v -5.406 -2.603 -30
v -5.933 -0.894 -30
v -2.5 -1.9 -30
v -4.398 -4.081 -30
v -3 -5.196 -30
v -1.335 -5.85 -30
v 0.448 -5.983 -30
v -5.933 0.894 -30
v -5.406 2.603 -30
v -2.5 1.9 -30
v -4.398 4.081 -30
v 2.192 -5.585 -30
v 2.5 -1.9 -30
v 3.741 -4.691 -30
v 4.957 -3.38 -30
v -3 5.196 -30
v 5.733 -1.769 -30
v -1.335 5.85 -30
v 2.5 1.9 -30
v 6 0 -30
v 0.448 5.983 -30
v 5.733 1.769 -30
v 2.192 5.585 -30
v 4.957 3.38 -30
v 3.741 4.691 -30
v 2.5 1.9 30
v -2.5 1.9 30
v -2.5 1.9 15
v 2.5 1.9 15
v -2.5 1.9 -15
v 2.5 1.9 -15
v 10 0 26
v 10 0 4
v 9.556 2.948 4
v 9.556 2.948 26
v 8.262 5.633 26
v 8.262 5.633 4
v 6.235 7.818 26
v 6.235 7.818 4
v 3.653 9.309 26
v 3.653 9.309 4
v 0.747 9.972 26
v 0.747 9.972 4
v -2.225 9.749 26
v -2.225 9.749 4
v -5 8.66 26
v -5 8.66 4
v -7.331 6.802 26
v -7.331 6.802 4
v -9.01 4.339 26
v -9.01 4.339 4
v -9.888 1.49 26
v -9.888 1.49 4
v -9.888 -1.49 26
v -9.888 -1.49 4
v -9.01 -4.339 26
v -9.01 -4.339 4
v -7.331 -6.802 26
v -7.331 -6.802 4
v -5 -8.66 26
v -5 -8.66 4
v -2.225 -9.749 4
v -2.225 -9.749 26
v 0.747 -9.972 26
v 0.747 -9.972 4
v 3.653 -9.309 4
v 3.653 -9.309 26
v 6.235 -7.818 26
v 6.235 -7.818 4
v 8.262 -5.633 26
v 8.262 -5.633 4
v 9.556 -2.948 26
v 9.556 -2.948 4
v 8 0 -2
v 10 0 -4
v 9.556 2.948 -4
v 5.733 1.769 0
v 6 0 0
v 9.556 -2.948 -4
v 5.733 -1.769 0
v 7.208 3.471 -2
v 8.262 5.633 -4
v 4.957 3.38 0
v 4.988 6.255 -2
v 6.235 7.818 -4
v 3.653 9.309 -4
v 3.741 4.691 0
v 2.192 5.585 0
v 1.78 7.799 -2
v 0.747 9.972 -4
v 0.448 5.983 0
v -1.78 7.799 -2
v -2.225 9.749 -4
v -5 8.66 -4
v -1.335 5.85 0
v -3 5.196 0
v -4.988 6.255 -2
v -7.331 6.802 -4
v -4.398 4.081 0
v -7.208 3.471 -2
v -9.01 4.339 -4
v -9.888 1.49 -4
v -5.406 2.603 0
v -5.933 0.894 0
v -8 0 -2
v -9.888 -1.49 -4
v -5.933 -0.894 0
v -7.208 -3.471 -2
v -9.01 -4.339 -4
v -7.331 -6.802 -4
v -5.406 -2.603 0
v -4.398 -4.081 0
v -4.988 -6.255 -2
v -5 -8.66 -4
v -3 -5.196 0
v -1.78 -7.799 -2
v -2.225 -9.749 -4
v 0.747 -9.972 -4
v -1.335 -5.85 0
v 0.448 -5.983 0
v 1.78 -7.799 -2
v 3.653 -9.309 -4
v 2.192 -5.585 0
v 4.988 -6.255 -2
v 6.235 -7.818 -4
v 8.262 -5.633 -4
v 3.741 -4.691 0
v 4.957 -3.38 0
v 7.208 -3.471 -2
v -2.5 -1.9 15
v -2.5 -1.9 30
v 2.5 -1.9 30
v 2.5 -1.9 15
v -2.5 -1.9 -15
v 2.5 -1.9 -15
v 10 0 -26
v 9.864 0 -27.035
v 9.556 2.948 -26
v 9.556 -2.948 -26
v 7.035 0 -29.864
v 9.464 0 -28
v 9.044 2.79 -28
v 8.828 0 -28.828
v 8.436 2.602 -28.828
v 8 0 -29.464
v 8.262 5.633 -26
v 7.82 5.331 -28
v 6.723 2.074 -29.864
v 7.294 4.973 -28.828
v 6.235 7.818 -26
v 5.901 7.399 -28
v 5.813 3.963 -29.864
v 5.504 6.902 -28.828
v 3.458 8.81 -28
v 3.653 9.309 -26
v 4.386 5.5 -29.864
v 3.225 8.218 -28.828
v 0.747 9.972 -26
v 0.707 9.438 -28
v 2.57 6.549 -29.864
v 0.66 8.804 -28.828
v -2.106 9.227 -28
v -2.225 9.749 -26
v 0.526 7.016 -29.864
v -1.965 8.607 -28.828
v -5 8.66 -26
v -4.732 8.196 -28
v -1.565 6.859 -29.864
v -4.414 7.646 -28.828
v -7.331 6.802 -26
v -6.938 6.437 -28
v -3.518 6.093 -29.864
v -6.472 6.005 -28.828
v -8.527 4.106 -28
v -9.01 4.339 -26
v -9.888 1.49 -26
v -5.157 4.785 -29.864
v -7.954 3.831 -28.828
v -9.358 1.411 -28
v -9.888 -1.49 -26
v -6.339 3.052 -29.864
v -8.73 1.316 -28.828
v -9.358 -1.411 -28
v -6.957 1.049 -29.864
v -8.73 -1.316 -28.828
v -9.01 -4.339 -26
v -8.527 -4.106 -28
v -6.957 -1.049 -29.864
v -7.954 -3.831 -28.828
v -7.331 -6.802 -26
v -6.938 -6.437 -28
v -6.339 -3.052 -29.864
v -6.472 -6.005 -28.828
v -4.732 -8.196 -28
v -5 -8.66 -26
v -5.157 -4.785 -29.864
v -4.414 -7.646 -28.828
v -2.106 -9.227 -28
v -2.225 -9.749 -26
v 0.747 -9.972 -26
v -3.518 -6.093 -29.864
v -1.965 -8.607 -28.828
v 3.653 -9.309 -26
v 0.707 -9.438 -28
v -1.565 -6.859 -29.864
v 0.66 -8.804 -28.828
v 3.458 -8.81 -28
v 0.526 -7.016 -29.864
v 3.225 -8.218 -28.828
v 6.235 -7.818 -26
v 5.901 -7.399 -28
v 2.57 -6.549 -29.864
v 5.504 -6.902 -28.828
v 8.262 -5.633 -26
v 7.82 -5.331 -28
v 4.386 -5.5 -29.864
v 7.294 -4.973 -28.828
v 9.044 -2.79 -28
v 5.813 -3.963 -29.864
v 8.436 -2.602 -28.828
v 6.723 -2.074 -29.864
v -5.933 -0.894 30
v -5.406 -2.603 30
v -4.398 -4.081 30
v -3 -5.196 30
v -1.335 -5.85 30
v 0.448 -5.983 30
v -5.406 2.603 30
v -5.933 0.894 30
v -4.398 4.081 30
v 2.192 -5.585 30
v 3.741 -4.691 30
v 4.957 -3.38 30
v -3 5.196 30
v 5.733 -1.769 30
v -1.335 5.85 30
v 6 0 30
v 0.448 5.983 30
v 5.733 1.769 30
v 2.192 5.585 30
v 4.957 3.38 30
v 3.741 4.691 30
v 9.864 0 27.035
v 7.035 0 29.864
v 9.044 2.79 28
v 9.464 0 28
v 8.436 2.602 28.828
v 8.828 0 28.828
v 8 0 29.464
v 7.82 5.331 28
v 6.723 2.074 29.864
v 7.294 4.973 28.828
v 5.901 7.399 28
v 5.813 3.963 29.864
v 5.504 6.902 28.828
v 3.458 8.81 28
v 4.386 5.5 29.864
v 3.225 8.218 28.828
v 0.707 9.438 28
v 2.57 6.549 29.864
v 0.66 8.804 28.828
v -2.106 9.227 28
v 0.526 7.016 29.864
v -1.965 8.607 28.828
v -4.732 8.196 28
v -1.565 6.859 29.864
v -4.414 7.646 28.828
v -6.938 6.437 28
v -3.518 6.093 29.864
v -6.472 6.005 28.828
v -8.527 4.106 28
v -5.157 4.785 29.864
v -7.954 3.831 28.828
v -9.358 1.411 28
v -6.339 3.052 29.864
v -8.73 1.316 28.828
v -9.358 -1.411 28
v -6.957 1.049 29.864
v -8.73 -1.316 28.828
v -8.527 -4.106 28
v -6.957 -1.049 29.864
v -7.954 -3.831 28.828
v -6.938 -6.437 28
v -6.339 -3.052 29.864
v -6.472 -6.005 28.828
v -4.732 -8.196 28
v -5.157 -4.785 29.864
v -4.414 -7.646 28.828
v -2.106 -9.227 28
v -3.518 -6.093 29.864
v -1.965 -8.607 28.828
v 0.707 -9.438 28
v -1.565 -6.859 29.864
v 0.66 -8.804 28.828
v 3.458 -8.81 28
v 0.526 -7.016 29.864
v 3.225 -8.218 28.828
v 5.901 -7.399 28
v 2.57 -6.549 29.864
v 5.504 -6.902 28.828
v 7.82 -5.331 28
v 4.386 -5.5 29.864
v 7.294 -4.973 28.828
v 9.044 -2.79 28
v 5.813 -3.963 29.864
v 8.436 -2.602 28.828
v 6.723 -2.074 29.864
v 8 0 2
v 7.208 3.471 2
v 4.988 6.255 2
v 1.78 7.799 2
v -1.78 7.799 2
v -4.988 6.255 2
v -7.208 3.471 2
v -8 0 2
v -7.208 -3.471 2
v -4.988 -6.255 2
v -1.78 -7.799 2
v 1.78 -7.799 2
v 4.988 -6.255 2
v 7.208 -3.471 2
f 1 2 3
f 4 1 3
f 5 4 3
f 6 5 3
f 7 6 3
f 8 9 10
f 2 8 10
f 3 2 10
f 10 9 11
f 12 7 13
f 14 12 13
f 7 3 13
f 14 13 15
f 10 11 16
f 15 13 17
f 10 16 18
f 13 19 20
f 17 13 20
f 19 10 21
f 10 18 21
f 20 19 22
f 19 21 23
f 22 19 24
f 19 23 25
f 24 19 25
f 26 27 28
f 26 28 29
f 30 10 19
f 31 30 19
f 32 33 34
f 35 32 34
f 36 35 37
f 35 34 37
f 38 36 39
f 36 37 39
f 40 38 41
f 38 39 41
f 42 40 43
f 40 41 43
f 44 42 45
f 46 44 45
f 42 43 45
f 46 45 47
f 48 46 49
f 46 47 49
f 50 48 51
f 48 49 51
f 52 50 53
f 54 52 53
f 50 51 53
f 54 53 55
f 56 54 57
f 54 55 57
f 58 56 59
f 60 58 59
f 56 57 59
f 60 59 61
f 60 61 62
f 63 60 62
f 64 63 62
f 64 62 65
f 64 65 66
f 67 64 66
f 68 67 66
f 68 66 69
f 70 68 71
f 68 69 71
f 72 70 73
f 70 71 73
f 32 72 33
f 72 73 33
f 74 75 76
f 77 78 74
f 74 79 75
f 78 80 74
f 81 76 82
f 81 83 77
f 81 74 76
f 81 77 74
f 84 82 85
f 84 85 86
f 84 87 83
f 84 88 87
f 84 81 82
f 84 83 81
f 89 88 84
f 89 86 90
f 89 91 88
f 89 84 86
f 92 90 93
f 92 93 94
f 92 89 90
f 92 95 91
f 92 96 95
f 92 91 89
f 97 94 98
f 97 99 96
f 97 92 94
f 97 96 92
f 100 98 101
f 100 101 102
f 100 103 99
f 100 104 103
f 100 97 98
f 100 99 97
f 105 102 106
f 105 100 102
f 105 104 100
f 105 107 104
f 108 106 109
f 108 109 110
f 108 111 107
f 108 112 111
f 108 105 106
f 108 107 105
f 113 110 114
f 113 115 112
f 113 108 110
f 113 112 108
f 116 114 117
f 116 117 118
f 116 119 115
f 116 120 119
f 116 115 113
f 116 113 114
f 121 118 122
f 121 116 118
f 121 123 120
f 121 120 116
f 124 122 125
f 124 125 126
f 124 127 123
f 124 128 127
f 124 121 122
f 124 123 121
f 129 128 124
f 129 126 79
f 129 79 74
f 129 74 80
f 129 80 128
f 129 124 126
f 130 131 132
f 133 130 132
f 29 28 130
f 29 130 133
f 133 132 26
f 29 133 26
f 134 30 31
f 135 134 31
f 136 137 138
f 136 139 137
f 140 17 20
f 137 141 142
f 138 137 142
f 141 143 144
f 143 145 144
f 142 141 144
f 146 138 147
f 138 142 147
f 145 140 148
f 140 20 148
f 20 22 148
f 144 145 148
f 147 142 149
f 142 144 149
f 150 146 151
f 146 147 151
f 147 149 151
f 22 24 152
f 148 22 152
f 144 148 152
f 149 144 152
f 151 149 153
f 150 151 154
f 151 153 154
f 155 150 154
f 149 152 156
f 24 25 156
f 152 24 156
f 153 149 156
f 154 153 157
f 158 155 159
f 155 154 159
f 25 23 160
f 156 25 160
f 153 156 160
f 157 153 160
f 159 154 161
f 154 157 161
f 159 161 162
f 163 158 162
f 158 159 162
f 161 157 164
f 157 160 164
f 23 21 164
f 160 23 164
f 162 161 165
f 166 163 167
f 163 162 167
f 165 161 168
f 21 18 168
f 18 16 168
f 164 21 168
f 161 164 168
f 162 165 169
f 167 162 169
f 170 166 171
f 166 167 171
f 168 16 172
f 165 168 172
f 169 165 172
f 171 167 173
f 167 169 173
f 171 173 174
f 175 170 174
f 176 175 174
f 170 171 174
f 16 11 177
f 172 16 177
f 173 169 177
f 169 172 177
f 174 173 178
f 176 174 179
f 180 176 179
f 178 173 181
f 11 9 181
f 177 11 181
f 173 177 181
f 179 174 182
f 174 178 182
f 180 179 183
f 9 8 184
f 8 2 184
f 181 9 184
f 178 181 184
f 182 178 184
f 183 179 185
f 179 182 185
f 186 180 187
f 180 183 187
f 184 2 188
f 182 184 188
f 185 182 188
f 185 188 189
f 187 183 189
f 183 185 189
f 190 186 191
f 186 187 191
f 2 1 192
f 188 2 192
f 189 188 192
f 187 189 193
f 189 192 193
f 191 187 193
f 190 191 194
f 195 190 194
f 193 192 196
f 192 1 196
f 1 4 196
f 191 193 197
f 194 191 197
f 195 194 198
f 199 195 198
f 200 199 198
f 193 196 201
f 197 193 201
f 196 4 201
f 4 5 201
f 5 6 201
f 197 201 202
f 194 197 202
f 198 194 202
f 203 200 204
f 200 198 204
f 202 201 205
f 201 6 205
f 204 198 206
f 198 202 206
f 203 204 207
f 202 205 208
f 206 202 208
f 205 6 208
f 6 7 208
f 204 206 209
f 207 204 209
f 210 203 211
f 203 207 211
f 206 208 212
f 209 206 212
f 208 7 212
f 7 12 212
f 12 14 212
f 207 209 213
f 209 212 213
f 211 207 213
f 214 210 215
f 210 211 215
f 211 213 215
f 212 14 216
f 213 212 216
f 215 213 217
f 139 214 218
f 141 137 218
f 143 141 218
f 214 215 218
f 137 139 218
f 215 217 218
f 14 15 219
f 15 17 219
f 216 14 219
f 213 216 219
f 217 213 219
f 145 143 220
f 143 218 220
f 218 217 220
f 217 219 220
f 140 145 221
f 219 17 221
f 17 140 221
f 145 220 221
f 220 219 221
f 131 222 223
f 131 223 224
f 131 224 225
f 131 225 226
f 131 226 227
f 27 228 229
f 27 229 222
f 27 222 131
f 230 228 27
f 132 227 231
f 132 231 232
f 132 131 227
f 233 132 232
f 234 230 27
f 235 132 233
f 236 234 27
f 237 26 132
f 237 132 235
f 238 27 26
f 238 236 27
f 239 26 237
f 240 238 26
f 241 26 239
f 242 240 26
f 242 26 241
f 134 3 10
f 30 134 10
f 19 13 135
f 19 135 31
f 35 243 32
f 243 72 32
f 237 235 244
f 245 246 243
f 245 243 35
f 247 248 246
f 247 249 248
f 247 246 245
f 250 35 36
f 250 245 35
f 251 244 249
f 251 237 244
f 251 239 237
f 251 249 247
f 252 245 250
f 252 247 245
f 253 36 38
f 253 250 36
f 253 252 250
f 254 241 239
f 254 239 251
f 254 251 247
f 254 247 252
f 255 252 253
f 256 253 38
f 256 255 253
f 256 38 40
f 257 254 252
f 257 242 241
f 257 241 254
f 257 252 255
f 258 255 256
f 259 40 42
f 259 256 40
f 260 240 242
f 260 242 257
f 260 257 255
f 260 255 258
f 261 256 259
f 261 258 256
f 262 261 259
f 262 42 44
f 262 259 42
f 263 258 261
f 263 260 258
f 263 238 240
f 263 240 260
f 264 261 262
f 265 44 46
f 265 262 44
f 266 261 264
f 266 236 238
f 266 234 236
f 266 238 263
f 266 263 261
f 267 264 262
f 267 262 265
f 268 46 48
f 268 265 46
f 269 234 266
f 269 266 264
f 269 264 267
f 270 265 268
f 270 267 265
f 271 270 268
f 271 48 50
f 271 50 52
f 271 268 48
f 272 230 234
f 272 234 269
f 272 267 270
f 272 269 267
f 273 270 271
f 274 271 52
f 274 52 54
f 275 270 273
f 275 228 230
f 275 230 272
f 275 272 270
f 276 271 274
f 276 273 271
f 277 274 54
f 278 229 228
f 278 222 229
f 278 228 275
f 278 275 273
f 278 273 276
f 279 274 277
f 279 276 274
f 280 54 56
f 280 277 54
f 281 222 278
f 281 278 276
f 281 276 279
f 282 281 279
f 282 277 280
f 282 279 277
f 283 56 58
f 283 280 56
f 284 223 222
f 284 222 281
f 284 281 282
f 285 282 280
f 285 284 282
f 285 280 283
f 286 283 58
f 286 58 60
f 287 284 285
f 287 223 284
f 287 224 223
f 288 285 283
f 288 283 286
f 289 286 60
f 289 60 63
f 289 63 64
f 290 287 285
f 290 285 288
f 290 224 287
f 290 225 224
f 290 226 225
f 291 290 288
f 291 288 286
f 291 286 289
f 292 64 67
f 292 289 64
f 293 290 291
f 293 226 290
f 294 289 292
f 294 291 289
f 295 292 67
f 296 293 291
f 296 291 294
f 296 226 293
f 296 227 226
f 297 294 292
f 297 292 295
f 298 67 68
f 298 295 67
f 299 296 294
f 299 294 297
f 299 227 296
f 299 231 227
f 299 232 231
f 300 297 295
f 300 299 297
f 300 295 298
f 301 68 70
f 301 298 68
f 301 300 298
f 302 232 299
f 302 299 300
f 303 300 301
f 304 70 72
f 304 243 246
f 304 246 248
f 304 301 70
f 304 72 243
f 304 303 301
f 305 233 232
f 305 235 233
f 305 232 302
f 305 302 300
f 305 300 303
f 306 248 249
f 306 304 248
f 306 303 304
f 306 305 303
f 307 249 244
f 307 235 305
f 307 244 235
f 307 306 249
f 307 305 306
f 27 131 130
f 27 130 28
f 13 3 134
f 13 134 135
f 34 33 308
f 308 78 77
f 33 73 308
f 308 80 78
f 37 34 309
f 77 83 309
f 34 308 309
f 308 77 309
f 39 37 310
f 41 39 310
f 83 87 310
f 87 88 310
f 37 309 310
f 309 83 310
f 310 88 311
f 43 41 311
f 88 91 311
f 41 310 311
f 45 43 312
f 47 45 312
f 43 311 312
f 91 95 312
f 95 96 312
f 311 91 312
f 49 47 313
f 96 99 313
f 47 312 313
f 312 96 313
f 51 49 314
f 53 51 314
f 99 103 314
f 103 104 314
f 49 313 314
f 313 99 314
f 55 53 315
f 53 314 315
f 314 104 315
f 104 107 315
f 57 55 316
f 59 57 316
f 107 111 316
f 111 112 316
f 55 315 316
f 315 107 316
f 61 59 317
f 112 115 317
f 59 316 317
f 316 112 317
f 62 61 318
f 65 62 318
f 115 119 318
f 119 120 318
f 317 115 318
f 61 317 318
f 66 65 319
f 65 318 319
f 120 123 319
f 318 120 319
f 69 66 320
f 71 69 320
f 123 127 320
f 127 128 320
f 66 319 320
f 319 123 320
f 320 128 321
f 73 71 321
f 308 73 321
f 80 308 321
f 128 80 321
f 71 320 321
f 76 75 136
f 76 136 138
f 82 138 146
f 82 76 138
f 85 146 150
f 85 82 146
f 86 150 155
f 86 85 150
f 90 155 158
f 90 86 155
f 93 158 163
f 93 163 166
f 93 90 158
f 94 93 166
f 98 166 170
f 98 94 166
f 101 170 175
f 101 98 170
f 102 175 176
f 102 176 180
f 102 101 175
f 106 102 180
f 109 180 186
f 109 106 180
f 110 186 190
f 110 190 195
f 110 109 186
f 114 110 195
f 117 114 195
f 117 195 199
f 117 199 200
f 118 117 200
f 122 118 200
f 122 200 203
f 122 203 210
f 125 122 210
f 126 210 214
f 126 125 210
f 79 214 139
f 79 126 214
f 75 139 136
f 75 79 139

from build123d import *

# Parameters (mm, degrees)
F0_R     = 10
F1_DEPTH = 30
F2_W     = 5
F2_H     = 3.8
F3_DEPTH = 15
F4_R     = 4
F5_SIZE  = 4


with BuildPart() as f1:
    # F0 (on Top) → F1 (new body)
    with BuildSketch(Plane.XY):
        Circle(F0_R)
    extrude(amount=F1_DEPTH)

    # F2 (on face) → F3 (cut)
    with BuildSketch(Plane.XY.offset(30)):
        Rectangle(F2_W, F2_H)
    extrude(amount=-F3_DEPTH, mode=Mode.SUBTRACT)

    # F4
    f4_edges = [f1.edges().sort_by_distance(p)[0] for p in [
        (-10, 0, 30),
    ]]
    fillet(f4_edges, radius=F4_R)

    # F5
    f5_edges = [f1.edges().sort_by_distance(p)[0] for p in [
        (-10, 0, 0),
    ]]
    chamfer(f5_edges, length=F5_SIZE)

    # F6: F1 across face


with BuildPart() as f1_1:
    add(f1.part)
    add(f1.part.mirror(Plane(origin=(0, 0, 0), x_dir=(1, 0, 0), z_dir=(0, 0, -1))))


solid = f1_1.part
